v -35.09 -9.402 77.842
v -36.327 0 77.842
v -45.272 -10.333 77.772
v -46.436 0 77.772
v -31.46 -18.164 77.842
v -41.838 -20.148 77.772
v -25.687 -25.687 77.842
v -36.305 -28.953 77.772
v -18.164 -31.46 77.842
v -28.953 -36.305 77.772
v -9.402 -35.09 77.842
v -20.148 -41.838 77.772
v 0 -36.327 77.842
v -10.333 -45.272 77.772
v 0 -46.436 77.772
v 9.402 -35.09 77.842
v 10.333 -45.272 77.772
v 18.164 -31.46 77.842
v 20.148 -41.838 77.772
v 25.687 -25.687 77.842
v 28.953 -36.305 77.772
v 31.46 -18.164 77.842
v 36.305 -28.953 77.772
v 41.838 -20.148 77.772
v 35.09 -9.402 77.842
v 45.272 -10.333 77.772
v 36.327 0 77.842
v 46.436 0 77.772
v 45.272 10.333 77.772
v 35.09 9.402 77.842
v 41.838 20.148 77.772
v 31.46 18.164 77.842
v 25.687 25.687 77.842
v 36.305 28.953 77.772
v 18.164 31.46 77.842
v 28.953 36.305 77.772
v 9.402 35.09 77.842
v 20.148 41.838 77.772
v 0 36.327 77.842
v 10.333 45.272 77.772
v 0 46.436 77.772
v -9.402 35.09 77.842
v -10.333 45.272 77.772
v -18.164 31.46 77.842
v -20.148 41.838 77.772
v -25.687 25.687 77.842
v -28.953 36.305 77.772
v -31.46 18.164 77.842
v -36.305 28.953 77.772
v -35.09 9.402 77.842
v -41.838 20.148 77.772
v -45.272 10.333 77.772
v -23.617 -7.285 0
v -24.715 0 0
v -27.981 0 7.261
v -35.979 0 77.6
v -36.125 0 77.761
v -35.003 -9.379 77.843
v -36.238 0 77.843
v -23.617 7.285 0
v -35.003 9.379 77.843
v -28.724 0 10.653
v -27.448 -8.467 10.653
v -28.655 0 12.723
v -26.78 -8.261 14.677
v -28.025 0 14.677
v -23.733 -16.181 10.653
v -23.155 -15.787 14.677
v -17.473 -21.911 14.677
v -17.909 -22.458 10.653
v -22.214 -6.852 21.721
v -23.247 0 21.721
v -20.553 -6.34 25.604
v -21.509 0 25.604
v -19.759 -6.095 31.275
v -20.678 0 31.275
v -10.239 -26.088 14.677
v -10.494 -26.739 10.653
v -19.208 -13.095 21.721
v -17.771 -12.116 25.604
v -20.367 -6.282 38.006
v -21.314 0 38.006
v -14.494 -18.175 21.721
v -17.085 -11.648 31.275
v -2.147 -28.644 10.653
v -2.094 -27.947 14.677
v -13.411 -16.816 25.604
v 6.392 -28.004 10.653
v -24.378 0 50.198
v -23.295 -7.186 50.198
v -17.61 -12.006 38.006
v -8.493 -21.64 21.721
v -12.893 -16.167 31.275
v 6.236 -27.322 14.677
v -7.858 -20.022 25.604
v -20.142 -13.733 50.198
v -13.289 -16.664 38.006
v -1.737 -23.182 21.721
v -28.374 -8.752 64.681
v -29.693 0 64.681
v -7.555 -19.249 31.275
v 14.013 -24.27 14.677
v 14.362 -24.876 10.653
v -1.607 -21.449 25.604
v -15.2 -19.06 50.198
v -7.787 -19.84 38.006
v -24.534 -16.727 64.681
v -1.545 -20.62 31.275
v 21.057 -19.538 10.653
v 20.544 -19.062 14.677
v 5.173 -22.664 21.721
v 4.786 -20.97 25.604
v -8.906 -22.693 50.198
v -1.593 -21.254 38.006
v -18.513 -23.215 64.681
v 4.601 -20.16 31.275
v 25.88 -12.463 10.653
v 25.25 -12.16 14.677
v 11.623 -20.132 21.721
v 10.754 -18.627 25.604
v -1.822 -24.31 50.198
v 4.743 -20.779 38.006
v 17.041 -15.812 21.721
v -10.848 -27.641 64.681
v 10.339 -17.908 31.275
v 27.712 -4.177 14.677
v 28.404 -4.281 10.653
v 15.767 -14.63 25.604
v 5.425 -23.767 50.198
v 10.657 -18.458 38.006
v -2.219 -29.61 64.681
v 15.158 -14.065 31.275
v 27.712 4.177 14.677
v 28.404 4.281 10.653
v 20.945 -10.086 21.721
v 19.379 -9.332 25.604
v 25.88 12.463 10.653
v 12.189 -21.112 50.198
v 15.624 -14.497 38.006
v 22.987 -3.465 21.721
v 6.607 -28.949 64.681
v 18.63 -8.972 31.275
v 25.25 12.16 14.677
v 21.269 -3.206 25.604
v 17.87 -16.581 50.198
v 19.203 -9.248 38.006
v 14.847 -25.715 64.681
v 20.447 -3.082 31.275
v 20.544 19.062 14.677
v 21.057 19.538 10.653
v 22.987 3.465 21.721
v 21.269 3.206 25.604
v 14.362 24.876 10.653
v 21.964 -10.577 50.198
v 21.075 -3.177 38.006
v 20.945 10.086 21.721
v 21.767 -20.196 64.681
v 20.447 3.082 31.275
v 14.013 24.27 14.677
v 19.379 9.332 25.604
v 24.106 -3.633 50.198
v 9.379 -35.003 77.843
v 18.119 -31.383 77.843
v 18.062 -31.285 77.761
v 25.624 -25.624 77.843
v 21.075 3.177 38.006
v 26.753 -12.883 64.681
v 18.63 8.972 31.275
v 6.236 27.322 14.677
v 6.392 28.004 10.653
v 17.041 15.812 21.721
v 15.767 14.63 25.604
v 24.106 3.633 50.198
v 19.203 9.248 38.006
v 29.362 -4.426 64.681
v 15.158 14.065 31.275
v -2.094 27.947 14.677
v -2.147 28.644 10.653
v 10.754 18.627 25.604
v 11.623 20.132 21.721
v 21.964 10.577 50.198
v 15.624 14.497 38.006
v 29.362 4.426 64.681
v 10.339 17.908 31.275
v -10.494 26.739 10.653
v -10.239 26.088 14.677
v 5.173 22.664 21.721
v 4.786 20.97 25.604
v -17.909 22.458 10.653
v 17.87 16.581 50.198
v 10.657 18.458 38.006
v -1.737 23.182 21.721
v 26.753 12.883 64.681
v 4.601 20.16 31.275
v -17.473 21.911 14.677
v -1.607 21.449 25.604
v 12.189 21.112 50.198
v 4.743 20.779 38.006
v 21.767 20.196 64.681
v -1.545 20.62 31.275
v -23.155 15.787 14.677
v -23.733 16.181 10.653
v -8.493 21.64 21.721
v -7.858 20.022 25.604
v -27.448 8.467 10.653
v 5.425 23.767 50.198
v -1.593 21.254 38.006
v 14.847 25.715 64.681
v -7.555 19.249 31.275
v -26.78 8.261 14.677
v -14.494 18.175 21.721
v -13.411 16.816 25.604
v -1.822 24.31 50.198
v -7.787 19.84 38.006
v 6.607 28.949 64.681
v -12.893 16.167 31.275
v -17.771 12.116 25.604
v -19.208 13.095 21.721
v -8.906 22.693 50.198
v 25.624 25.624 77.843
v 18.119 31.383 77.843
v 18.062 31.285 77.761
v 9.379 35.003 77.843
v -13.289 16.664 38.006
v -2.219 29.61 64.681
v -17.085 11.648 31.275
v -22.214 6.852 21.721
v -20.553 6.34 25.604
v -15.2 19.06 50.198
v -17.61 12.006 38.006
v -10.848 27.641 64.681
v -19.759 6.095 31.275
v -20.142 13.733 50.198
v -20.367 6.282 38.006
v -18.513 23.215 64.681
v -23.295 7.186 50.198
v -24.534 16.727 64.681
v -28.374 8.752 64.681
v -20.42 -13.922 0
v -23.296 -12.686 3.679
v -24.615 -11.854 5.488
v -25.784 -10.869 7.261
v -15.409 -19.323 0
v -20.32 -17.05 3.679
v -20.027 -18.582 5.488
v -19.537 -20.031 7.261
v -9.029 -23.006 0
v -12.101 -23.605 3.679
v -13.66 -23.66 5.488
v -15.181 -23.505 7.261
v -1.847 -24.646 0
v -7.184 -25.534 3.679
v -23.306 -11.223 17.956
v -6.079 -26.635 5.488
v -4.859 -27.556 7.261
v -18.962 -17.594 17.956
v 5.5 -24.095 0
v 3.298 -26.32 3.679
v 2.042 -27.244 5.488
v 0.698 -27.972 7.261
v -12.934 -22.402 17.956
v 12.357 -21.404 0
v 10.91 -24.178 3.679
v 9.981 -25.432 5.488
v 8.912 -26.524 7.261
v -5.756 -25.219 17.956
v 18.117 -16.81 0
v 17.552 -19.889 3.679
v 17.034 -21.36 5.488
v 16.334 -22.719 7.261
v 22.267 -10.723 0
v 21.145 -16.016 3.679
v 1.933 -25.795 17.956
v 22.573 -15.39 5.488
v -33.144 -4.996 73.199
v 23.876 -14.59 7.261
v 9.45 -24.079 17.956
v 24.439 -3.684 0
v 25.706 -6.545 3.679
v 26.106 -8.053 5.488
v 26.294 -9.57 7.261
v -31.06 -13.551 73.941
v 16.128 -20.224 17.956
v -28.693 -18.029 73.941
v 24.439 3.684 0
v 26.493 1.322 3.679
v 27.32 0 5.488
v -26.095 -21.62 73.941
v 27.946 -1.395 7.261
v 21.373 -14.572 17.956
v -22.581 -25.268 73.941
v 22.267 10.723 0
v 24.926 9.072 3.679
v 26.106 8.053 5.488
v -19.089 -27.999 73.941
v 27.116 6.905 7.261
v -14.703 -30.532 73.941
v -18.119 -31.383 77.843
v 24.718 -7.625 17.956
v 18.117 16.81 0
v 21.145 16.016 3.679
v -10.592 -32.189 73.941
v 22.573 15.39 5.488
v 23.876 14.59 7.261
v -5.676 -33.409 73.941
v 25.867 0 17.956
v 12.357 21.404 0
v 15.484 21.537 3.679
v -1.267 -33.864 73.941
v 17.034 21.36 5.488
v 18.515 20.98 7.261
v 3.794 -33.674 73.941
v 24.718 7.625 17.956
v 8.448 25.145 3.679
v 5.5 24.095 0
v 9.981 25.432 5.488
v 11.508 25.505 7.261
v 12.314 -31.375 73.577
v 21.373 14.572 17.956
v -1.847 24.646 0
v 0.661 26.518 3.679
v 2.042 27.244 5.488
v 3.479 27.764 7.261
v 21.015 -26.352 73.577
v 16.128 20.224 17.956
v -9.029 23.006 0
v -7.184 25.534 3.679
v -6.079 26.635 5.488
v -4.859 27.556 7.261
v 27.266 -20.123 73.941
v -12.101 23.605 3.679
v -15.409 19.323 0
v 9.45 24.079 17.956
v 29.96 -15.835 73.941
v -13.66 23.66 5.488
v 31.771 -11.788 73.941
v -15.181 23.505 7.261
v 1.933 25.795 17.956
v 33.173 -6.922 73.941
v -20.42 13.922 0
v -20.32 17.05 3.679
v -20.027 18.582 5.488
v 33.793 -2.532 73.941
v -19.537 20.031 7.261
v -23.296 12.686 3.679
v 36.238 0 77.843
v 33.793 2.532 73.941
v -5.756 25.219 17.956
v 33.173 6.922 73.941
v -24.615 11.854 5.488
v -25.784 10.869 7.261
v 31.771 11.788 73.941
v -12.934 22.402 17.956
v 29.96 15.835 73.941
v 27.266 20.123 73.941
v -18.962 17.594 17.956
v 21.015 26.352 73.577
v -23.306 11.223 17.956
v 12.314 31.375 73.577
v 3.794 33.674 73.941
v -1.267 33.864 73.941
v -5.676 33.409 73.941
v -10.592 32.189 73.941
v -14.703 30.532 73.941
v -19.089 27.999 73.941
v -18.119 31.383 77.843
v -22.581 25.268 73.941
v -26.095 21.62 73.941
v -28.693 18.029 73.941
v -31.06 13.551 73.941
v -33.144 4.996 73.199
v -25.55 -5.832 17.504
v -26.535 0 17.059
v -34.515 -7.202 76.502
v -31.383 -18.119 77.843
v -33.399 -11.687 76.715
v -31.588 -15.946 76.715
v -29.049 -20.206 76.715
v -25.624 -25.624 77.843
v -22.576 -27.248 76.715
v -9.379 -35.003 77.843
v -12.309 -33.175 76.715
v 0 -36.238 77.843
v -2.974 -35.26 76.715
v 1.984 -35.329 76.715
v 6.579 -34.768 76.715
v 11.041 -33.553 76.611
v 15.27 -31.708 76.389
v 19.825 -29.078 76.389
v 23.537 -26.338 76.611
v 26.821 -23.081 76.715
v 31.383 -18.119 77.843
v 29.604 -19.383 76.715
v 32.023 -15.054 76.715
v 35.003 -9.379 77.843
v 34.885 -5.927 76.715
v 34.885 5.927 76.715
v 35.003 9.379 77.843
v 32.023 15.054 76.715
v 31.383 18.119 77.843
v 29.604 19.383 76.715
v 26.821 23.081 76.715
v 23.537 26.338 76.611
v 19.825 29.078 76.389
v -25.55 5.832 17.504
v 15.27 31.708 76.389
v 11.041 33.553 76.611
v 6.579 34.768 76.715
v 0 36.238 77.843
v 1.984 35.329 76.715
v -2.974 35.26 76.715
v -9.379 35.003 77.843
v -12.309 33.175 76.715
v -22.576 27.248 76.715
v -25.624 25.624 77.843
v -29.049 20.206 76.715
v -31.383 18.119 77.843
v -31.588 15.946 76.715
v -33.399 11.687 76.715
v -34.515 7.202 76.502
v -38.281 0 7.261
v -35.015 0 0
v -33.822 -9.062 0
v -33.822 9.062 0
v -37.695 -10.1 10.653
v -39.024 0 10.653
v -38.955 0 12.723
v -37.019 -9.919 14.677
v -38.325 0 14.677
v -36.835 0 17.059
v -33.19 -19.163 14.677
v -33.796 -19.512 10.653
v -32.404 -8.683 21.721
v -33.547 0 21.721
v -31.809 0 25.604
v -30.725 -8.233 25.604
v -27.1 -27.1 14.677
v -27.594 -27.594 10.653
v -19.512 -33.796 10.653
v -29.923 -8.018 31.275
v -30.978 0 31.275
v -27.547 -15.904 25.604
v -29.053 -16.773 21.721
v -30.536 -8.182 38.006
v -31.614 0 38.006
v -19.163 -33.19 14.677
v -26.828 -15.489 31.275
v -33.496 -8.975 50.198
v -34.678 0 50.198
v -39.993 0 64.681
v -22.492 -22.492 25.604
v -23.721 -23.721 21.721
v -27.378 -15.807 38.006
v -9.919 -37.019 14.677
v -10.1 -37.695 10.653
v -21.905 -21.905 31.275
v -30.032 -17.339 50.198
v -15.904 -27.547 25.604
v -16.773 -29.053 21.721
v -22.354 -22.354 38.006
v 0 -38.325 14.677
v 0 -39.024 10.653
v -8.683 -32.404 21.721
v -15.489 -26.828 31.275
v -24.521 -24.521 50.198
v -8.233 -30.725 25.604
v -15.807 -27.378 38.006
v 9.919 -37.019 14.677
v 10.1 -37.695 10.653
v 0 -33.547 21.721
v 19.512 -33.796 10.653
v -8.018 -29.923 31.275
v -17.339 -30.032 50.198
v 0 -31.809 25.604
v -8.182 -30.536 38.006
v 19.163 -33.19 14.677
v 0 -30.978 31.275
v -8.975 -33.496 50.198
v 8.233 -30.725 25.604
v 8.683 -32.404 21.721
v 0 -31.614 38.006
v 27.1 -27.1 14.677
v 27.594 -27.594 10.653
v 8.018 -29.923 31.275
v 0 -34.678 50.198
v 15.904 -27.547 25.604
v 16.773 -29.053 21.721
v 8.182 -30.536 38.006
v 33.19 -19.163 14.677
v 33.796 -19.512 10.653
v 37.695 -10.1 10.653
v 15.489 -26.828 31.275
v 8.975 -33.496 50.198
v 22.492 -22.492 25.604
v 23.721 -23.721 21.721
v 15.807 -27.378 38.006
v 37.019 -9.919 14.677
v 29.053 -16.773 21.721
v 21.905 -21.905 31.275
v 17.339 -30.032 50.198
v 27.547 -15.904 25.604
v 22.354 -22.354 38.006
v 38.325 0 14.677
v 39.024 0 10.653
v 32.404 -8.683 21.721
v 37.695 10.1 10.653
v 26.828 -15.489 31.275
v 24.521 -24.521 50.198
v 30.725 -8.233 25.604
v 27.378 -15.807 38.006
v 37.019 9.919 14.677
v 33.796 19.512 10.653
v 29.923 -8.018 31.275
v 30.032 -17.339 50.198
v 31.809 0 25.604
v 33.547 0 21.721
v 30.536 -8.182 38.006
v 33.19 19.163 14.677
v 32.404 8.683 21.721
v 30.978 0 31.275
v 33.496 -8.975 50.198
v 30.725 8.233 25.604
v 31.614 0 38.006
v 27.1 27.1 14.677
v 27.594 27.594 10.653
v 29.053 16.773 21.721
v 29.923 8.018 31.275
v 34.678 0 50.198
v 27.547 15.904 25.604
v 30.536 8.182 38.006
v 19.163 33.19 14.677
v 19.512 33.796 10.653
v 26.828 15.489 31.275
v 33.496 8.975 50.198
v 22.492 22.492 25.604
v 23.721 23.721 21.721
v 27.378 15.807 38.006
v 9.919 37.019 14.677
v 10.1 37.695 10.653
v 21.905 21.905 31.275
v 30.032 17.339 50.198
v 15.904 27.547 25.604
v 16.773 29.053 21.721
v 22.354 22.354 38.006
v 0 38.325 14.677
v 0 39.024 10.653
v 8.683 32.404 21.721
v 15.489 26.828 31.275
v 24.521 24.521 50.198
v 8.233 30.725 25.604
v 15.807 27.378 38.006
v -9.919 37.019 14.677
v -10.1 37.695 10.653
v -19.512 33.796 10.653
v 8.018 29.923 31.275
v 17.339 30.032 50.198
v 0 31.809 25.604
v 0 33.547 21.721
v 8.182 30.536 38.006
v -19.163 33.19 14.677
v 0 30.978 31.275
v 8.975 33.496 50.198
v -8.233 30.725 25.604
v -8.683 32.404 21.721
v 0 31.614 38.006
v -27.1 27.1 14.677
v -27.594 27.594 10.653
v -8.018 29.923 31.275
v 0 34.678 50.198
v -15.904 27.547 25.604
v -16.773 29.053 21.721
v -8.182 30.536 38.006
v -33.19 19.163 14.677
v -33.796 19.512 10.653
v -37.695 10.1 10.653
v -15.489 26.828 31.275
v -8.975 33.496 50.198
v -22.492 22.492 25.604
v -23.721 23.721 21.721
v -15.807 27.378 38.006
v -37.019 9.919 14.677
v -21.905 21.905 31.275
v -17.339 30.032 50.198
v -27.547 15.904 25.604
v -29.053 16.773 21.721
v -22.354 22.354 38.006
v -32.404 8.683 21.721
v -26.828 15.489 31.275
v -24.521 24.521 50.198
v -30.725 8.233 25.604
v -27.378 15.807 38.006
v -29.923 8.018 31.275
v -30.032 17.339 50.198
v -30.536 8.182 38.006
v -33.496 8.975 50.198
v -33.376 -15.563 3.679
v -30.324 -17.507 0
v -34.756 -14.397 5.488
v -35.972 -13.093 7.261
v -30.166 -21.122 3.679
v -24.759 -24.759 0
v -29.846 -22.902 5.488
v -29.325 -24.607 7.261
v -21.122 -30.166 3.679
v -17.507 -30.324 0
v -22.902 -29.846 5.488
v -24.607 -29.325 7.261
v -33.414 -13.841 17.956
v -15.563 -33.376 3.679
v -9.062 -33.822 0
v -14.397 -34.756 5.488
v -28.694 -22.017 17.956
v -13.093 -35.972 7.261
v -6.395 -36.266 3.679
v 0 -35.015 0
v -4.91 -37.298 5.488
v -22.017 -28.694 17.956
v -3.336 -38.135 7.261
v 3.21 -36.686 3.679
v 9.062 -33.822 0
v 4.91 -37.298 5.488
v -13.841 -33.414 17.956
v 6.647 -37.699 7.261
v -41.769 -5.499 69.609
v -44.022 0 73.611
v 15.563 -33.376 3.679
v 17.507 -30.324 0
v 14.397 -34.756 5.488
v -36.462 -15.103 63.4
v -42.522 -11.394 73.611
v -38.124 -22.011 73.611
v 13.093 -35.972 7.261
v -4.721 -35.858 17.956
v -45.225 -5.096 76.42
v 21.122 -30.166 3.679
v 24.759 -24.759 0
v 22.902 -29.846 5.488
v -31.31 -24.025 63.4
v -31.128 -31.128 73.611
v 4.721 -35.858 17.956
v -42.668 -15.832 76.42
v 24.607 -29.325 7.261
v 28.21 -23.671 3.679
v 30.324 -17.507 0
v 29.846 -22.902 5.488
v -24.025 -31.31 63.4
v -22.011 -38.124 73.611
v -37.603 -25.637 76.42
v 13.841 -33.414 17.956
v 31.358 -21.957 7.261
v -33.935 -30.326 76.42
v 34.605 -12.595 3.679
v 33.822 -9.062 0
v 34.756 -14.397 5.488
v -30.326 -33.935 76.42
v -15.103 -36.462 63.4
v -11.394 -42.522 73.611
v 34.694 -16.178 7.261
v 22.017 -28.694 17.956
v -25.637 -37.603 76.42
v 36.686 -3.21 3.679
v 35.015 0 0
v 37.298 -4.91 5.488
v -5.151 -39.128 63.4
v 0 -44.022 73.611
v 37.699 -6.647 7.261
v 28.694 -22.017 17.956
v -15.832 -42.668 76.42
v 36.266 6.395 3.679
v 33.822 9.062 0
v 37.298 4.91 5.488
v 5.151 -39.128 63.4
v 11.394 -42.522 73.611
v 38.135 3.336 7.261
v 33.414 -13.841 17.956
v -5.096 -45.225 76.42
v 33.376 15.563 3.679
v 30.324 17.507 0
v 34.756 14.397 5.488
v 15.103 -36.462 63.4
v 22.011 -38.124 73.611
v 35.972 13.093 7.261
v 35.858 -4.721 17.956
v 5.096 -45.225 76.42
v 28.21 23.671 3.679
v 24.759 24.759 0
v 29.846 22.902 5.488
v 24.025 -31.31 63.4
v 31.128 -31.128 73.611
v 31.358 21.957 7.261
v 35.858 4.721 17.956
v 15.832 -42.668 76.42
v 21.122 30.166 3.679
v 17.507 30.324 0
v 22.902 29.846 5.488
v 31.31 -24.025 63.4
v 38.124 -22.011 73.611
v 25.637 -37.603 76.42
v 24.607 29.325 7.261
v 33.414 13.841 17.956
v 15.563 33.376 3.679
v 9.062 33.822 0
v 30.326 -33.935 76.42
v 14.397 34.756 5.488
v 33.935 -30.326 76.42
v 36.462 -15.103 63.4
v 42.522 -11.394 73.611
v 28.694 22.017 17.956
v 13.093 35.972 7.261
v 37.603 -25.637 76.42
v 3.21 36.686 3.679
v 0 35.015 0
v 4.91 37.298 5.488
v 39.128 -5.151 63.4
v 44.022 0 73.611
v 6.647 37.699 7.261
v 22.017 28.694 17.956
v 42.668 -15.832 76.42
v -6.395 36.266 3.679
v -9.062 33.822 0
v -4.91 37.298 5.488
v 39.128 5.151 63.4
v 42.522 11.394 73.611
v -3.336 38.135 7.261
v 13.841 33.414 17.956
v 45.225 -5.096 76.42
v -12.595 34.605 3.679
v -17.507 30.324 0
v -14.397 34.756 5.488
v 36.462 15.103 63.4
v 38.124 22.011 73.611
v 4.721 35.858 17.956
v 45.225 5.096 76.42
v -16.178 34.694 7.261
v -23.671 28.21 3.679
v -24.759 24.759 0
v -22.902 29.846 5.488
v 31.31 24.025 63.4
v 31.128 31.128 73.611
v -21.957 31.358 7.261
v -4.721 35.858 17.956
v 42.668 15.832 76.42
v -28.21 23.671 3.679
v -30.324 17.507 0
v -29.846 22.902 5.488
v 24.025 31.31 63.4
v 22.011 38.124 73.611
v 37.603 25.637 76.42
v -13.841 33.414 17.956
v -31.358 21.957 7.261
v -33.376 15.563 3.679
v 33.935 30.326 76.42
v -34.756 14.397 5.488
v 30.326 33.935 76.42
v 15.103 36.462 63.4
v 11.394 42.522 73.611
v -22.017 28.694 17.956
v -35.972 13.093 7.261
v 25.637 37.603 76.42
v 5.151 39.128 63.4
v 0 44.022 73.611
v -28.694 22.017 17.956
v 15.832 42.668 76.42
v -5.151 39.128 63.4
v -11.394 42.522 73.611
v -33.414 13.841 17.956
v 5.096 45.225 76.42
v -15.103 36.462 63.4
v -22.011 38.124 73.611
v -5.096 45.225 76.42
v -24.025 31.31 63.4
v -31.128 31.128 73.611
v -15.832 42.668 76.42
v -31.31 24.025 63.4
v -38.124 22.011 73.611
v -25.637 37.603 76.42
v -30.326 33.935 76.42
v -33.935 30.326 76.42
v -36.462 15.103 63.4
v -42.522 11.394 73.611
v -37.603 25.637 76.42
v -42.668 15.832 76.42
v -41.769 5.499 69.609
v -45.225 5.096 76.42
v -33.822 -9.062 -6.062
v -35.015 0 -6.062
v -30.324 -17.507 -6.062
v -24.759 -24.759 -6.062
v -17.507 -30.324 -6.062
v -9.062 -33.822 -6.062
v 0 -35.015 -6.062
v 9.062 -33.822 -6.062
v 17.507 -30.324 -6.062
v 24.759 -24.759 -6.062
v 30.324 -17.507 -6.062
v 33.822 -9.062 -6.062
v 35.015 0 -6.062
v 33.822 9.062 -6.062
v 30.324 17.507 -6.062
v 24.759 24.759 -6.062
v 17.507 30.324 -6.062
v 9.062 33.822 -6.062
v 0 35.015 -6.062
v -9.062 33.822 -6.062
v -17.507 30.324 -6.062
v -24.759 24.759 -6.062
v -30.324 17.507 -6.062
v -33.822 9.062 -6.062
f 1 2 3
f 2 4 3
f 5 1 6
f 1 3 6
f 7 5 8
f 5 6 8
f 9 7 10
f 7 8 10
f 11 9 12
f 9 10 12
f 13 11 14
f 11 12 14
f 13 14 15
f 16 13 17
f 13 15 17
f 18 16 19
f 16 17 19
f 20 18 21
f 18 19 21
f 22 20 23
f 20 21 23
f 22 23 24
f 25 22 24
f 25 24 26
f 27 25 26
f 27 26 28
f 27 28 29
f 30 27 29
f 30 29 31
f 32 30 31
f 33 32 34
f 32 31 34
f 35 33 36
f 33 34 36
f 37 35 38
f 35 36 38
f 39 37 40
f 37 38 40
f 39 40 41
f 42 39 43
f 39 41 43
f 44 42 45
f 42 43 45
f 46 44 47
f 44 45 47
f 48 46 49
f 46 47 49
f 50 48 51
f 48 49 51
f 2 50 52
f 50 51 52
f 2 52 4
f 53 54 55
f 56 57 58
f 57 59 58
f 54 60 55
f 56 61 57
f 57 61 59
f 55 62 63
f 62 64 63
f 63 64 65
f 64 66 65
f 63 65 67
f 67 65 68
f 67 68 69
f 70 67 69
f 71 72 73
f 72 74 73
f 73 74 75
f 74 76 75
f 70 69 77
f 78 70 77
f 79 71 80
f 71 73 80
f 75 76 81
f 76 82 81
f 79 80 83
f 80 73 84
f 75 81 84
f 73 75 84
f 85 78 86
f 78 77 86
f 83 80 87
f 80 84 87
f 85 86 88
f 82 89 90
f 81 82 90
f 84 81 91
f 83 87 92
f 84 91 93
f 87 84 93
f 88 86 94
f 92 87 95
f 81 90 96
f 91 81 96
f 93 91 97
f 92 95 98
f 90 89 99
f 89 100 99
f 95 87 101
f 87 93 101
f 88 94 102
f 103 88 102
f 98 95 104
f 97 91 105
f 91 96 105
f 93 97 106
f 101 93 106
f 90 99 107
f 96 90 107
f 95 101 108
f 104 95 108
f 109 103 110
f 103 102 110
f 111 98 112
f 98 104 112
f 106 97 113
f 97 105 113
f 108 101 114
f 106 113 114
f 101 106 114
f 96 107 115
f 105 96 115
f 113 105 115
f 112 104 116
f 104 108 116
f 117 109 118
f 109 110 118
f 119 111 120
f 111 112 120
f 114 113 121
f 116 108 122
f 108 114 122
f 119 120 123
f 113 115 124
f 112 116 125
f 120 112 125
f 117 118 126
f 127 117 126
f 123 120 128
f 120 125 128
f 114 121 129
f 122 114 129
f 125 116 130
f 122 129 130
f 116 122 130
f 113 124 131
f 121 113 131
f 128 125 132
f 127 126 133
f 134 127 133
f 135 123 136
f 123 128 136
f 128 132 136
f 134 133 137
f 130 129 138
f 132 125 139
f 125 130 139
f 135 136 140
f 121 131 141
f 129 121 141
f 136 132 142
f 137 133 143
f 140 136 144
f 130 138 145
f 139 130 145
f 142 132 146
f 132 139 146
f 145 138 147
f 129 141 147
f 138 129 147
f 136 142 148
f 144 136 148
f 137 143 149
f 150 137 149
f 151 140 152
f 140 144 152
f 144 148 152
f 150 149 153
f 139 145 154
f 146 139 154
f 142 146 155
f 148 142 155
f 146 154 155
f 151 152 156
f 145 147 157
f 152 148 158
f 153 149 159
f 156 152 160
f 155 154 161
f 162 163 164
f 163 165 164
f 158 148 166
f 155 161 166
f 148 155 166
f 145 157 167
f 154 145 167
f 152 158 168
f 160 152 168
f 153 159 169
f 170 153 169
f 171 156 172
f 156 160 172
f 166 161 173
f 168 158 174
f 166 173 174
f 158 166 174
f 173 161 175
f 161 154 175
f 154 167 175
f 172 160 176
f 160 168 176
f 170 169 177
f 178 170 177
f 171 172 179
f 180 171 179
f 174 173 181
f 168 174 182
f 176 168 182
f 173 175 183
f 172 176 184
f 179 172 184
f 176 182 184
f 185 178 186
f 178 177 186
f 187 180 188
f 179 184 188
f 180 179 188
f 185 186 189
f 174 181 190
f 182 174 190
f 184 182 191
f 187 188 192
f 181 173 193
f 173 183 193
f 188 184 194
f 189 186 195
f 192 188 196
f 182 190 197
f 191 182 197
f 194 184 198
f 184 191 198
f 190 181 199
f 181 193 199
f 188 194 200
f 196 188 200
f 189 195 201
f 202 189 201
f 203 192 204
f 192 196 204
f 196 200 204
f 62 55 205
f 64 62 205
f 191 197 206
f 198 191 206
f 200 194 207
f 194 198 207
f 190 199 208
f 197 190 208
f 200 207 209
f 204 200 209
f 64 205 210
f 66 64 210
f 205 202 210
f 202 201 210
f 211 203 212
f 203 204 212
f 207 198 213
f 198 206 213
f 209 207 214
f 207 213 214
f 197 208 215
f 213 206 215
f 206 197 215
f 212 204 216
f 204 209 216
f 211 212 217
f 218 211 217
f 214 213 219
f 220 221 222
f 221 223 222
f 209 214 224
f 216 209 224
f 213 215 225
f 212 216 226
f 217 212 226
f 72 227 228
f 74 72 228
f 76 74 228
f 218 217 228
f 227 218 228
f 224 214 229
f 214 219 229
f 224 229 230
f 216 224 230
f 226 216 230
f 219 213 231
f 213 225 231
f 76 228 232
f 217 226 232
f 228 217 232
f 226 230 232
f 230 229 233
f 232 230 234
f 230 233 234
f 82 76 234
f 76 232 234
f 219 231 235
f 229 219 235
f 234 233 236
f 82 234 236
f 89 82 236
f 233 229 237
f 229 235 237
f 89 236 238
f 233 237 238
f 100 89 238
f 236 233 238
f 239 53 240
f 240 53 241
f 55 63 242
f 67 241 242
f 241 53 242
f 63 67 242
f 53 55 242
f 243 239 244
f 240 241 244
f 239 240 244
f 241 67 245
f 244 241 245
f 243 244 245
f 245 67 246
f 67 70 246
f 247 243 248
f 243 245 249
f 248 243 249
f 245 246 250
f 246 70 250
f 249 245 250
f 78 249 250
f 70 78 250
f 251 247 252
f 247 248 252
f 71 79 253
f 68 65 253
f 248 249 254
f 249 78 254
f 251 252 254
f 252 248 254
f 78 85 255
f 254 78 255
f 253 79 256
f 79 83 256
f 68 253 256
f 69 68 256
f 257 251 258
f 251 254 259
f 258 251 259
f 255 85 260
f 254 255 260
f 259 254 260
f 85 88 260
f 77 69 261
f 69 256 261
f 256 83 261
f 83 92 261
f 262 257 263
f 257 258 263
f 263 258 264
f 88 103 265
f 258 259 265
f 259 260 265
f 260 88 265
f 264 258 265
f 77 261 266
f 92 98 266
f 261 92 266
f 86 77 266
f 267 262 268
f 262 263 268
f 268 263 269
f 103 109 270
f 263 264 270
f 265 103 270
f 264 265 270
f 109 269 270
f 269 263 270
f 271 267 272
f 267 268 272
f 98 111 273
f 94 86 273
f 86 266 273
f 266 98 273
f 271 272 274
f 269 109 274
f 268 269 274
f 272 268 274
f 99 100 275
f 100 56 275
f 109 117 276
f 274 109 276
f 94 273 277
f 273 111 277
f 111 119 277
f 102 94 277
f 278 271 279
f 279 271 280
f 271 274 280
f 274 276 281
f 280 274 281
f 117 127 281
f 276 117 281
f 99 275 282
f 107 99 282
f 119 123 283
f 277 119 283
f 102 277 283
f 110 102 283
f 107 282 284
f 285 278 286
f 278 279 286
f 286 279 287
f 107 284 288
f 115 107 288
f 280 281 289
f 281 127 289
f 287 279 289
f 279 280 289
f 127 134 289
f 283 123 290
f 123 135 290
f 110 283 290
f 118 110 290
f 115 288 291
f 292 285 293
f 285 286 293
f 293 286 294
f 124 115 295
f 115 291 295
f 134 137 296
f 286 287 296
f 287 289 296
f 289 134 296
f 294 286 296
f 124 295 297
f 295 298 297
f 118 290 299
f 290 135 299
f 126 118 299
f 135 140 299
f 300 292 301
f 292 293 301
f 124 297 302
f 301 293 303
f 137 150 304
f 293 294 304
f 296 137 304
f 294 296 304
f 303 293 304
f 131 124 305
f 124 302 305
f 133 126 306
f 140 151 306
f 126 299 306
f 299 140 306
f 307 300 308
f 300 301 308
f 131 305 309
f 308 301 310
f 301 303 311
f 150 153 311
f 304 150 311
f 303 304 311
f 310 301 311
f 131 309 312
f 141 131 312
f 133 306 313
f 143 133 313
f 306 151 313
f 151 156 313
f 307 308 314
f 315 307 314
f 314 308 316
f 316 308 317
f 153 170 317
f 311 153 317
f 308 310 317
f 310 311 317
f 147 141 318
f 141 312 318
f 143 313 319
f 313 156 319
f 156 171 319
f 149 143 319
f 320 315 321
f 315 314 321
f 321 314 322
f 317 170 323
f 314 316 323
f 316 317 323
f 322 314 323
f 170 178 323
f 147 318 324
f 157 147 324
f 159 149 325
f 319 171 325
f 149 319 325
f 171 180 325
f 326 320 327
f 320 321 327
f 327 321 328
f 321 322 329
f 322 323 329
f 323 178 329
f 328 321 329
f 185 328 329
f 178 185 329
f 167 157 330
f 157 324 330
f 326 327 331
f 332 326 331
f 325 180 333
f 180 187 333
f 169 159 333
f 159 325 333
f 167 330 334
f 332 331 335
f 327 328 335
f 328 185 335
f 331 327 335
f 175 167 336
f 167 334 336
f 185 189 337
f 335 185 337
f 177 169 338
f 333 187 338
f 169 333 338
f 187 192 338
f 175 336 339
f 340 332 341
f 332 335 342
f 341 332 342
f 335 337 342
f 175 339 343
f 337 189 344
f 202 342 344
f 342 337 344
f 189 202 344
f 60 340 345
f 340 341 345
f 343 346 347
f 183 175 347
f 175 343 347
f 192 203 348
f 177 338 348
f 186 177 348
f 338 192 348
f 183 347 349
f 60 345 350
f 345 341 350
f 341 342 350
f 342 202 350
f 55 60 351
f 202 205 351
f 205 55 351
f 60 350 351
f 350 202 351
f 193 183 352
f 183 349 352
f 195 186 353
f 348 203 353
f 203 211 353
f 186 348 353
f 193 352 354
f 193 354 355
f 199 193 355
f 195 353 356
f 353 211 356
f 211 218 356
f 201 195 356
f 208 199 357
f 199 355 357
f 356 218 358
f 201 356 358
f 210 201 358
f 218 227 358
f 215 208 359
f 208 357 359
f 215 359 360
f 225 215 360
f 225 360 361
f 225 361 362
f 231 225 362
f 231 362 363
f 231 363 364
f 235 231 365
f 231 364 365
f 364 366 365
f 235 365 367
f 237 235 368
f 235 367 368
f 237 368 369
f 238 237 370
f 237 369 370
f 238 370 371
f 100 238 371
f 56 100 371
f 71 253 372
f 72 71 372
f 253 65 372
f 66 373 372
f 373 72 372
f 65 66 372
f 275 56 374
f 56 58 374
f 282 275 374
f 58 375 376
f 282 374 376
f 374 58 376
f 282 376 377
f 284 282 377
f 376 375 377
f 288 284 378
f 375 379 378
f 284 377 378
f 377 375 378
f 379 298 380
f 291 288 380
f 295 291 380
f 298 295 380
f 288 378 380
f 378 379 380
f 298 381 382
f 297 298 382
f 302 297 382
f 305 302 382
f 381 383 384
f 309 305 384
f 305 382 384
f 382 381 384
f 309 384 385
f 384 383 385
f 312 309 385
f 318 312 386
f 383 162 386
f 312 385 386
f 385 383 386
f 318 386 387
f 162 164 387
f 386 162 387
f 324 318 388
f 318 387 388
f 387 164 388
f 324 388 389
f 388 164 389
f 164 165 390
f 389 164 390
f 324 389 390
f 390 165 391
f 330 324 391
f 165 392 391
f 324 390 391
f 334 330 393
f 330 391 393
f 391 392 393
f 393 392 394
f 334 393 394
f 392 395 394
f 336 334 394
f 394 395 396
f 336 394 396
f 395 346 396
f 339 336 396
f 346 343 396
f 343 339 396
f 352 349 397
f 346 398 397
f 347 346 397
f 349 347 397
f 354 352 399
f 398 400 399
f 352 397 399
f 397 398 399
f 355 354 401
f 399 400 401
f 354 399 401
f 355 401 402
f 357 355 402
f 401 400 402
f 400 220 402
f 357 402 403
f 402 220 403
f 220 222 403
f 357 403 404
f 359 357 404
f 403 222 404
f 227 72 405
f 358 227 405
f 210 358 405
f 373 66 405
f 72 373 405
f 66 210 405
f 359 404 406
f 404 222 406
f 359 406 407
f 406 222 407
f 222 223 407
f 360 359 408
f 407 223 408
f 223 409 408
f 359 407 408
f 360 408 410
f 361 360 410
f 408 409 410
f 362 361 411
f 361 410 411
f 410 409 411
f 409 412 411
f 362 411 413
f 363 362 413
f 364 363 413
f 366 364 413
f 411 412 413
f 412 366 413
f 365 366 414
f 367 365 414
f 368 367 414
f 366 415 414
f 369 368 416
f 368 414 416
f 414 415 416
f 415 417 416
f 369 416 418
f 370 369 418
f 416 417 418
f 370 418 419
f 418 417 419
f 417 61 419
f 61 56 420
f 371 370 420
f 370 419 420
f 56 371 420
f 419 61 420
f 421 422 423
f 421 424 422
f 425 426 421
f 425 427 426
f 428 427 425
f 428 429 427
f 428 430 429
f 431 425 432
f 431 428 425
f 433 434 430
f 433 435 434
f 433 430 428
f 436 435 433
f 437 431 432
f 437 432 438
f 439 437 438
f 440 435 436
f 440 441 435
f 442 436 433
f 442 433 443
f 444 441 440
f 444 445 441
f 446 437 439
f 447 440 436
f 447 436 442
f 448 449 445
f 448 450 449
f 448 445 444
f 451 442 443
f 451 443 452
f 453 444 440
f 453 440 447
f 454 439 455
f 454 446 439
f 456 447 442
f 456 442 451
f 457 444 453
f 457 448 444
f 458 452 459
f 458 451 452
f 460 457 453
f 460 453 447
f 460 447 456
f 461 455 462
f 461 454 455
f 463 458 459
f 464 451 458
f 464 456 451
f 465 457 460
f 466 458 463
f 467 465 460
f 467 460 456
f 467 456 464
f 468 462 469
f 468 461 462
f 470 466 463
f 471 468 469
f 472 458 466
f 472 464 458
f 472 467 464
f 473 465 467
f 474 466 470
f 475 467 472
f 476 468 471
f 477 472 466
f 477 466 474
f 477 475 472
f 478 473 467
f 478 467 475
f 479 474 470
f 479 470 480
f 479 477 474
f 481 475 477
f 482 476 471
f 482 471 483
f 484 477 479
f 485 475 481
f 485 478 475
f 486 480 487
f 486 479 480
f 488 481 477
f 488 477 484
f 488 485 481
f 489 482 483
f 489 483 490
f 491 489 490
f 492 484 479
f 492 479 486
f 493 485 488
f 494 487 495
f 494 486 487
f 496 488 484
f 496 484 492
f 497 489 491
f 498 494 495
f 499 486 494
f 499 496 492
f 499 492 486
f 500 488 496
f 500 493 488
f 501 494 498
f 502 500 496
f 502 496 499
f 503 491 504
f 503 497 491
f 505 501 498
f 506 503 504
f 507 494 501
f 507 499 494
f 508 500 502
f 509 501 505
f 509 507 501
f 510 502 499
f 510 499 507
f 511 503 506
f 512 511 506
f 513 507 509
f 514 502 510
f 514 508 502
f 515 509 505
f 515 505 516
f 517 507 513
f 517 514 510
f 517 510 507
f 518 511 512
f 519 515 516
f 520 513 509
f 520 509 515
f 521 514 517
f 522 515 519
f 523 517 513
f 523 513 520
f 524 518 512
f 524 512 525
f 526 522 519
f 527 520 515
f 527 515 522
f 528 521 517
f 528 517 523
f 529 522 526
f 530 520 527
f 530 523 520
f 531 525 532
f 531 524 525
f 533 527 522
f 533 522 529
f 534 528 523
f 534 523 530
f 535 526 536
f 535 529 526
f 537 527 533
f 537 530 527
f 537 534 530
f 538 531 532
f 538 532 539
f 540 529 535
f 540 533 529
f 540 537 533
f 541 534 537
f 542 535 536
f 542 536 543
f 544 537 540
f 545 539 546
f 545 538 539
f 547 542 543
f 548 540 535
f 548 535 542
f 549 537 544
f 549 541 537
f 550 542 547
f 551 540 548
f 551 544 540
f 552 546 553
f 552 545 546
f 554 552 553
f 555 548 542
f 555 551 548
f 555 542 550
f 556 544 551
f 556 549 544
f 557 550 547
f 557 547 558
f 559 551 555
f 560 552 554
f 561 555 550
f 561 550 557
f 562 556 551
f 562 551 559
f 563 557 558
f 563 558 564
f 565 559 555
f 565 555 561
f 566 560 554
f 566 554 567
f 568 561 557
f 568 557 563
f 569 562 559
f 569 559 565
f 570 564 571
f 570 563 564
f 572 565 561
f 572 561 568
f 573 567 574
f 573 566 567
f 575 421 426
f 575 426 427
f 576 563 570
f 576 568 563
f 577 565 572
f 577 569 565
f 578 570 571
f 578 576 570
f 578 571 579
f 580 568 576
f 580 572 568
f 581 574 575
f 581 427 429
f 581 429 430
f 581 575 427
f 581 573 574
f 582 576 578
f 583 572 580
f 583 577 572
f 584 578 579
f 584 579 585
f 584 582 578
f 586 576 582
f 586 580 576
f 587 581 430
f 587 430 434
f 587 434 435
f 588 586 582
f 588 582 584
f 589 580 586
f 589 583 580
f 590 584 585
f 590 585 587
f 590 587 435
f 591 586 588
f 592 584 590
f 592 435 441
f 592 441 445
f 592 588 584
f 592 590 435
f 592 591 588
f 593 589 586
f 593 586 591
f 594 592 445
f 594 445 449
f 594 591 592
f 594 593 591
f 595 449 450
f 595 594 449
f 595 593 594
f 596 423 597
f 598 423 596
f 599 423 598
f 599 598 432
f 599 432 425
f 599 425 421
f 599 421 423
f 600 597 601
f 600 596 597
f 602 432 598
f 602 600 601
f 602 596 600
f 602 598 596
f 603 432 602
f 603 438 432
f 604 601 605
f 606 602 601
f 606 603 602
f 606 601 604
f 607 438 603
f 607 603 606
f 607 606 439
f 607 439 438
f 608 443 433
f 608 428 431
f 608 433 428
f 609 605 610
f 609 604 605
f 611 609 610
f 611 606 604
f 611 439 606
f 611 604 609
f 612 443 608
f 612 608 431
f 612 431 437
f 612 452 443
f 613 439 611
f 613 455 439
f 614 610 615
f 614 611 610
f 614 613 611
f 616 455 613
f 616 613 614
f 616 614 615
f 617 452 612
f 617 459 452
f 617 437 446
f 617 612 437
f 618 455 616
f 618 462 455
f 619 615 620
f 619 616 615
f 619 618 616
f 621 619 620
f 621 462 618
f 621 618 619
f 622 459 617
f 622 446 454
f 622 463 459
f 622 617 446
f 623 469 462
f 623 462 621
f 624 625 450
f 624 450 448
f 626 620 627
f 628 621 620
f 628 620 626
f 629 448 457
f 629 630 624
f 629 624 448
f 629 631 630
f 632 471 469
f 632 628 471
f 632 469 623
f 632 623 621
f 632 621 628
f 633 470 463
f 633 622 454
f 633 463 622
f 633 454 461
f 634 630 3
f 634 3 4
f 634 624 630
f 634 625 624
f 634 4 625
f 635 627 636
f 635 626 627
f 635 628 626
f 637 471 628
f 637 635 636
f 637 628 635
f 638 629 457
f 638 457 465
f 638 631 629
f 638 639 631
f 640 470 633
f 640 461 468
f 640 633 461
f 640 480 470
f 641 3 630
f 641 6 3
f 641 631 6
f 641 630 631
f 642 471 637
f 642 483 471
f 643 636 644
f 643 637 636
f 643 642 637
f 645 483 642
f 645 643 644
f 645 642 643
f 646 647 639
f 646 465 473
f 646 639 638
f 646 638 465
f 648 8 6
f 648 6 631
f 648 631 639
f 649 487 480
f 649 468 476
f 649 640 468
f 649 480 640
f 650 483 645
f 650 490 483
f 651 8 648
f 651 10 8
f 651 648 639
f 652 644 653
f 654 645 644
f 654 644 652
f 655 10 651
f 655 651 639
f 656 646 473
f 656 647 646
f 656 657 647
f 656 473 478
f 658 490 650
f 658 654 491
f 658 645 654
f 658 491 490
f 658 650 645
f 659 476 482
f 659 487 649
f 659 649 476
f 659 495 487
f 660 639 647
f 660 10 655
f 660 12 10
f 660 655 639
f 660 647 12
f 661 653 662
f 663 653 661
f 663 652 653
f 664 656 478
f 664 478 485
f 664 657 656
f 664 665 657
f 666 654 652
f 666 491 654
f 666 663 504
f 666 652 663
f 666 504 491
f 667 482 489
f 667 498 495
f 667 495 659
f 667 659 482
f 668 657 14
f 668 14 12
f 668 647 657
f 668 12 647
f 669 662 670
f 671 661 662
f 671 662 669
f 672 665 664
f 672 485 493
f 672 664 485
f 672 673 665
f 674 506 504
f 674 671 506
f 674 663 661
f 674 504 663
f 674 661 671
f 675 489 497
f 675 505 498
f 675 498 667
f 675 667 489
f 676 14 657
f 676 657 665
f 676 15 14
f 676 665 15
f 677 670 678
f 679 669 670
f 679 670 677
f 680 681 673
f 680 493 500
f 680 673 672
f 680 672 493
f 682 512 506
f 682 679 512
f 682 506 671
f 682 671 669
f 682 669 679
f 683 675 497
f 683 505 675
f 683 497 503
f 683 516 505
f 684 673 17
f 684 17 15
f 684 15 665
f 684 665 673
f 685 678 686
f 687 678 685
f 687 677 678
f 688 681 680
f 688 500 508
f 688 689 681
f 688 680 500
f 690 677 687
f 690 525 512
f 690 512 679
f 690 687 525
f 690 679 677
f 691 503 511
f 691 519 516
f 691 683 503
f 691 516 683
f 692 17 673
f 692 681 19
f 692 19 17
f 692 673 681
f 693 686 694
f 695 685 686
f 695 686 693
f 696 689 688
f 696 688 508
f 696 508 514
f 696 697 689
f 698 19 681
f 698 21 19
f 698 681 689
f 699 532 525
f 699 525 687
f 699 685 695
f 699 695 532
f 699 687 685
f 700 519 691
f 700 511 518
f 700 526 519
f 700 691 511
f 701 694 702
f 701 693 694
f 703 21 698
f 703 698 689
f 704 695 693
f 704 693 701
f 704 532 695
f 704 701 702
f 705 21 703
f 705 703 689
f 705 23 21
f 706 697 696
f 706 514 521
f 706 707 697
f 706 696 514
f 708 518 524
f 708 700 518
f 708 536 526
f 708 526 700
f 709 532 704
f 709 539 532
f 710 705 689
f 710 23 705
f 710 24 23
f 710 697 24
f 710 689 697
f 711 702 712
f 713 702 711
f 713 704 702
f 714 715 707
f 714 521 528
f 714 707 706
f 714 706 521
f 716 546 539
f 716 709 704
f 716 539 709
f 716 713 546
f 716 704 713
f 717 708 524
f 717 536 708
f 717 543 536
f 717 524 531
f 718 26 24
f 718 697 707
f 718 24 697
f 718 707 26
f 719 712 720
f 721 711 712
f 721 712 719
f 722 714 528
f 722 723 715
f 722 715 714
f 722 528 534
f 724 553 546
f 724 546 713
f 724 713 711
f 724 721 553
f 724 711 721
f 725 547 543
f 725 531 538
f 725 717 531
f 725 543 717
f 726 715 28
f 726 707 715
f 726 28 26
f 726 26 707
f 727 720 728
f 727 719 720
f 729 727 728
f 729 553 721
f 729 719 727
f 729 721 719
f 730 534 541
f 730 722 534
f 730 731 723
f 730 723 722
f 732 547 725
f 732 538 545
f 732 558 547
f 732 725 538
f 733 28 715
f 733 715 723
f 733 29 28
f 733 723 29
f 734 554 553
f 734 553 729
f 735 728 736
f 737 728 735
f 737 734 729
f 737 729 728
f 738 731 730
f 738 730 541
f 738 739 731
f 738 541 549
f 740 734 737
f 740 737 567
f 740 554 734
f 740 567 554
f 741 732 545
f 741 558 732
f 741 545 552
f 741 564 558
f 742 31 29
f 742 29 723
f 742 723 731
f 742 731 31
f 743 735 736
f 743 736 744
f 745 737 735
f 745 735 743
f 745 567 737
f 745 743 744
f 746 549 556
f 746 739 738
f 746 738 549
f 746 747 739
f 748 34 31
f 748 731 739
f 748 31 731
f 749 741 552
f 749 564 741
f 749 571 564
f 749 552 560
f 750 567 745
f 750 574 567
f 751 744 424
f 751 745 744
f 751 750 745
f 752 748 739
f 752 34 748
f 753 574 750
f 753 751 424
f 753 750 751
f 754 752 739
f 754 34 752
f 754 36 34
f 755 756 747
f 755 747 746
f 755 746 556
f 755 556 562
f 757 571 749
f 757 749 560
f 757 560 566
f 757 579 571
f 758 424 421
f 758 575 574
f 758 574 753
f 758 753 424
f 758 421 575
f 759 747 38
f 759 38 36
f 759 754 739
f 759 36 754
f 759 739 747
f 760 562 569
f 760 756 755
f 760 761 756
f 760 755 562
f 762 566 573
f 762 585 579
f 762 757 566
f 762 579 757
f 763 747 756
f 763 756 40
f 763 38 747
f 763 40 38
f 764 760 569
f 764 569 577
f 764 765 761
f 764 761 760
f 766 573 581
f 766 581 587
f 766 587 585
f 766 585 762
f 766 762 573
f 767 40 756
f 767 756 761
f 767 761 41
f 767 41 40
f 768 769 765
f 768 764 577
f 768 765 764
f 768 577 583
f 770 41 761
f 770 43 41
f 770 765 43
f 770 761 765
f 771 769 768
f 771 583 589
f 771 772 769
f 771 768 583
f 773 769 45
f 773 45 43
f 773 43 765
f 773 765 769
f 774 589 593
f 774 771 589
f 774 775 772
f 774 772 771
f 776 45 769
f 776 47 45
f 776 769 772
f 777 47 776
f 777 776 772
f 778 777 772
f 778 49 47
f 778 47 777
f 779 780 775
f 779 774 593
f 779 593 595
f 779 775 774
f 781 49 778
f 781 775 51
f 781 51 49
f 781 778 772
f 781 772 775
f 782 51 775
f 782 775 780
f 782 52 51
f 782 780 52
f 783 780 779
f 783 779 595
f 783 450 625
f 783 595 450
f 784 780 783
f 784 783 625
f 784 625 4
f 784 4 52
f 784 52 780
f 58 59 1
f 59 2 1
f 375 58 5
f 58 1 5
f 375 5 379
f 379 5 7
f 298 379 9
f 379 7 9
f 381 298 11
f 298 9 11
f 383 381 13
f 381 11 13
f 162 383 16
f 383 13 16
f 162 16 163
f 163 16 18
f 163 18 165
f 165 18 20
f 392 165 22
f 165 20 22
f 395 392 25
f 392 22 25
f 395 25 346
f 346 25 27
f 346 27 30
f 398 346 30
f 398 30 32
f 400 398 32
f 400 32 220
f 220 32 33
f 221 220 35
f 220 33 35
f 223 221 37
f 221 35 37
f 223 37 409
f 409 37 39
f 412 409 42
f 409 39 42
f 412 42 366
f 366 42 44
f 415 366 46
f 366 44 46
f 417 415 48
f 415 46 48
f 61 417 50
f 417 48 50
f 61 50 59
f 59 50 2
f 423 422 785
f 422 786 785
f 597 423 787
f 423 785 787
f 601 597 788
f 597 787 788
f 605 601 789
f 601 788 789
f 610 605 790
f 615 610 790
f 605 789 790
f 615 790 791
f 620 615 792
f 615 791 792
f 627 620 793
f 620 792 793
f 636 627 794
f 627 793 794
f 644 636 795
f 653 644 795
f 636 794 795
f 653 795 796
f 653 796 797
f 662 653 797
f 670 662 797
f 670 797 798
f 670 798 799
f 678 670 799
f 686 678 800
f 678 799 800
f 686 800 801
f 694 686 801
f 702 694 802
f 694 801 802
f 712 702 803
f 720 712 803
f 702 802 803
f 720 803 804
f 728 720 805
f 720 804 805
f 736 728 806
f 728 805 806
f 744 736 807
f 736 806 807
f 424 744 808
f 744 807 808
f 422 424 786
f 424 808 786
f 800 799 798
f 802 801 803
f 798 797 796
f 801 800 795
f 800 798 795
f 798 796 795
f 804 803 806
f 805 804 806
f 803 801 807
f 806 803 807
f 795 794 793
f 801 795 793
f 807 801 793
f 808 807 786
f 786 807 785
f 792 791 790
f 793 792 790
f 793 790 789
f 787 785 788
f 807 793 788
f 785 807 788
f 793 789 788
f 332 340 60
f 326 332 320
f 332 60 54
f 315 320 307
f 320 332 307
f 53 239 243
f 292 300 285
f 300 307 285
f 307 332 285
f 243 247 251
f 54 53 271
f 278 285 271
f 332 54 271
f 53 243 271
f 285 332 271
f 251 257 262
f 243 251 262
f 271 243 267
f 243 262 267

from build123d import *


with BuildPart() as f1:
    # F0 (on Front) → F1 (revolve)
    with BuildSketch(Plane.XZ):
        with BuildLine():
            add(Edge.make_bspline(
                [(-35.0147932768, 0), (-37.4634319109, 4.8368983882), (-42.7291387509, 15.2384695191), (-21.6225706668, 26.2662494757), (-44.4626013006, 75.9879487863), (-46.4363805635, 77.7716507864)],
                knots=[0, 0, 0, 0, 0.2395673788, 0.5151807898, 0.9578898823, 0.9578898823, 0.9578898823, 0.9578898823], degree=3))
            Line((-35.0147932768, 0), (-35.0147932768, -6.0617593117))
            Line((-35.0147932768, -6.0617593117), (0, -6.0617593117))
            Line((0, -6.0617593117), (0, 0))
            Line((0, 0), (-24.7147958726, 0))
            add(Edge.make_bspline(
                [(-24.7147958726, 0), (-27.1634345067, 4.8368983882), (-32.4291413467, 15.2384695191), (-11.132741323, 26.3654330498), (-34.7160322173, 77.1865908991), (-36.2376665324, 77.8426676989)],
                knots=[0, 0, 0, 0, 0.2395673788, 0.5151807898, 0.9665051197, 0.9665051197, 0.9665051197, 0.9665051197], degree=3))
            Line((-36.2376665324, 77.8426676989), (-36.327380117, 77.8420429944))
            Line((-36.327380117, 77.8420429944), (-46.4363805635, 77.7716507864))
        make_face()
    revolve(axis=Axis((0, 0, 10.282183066), (0, 0, 1)))


solid = f1.part
